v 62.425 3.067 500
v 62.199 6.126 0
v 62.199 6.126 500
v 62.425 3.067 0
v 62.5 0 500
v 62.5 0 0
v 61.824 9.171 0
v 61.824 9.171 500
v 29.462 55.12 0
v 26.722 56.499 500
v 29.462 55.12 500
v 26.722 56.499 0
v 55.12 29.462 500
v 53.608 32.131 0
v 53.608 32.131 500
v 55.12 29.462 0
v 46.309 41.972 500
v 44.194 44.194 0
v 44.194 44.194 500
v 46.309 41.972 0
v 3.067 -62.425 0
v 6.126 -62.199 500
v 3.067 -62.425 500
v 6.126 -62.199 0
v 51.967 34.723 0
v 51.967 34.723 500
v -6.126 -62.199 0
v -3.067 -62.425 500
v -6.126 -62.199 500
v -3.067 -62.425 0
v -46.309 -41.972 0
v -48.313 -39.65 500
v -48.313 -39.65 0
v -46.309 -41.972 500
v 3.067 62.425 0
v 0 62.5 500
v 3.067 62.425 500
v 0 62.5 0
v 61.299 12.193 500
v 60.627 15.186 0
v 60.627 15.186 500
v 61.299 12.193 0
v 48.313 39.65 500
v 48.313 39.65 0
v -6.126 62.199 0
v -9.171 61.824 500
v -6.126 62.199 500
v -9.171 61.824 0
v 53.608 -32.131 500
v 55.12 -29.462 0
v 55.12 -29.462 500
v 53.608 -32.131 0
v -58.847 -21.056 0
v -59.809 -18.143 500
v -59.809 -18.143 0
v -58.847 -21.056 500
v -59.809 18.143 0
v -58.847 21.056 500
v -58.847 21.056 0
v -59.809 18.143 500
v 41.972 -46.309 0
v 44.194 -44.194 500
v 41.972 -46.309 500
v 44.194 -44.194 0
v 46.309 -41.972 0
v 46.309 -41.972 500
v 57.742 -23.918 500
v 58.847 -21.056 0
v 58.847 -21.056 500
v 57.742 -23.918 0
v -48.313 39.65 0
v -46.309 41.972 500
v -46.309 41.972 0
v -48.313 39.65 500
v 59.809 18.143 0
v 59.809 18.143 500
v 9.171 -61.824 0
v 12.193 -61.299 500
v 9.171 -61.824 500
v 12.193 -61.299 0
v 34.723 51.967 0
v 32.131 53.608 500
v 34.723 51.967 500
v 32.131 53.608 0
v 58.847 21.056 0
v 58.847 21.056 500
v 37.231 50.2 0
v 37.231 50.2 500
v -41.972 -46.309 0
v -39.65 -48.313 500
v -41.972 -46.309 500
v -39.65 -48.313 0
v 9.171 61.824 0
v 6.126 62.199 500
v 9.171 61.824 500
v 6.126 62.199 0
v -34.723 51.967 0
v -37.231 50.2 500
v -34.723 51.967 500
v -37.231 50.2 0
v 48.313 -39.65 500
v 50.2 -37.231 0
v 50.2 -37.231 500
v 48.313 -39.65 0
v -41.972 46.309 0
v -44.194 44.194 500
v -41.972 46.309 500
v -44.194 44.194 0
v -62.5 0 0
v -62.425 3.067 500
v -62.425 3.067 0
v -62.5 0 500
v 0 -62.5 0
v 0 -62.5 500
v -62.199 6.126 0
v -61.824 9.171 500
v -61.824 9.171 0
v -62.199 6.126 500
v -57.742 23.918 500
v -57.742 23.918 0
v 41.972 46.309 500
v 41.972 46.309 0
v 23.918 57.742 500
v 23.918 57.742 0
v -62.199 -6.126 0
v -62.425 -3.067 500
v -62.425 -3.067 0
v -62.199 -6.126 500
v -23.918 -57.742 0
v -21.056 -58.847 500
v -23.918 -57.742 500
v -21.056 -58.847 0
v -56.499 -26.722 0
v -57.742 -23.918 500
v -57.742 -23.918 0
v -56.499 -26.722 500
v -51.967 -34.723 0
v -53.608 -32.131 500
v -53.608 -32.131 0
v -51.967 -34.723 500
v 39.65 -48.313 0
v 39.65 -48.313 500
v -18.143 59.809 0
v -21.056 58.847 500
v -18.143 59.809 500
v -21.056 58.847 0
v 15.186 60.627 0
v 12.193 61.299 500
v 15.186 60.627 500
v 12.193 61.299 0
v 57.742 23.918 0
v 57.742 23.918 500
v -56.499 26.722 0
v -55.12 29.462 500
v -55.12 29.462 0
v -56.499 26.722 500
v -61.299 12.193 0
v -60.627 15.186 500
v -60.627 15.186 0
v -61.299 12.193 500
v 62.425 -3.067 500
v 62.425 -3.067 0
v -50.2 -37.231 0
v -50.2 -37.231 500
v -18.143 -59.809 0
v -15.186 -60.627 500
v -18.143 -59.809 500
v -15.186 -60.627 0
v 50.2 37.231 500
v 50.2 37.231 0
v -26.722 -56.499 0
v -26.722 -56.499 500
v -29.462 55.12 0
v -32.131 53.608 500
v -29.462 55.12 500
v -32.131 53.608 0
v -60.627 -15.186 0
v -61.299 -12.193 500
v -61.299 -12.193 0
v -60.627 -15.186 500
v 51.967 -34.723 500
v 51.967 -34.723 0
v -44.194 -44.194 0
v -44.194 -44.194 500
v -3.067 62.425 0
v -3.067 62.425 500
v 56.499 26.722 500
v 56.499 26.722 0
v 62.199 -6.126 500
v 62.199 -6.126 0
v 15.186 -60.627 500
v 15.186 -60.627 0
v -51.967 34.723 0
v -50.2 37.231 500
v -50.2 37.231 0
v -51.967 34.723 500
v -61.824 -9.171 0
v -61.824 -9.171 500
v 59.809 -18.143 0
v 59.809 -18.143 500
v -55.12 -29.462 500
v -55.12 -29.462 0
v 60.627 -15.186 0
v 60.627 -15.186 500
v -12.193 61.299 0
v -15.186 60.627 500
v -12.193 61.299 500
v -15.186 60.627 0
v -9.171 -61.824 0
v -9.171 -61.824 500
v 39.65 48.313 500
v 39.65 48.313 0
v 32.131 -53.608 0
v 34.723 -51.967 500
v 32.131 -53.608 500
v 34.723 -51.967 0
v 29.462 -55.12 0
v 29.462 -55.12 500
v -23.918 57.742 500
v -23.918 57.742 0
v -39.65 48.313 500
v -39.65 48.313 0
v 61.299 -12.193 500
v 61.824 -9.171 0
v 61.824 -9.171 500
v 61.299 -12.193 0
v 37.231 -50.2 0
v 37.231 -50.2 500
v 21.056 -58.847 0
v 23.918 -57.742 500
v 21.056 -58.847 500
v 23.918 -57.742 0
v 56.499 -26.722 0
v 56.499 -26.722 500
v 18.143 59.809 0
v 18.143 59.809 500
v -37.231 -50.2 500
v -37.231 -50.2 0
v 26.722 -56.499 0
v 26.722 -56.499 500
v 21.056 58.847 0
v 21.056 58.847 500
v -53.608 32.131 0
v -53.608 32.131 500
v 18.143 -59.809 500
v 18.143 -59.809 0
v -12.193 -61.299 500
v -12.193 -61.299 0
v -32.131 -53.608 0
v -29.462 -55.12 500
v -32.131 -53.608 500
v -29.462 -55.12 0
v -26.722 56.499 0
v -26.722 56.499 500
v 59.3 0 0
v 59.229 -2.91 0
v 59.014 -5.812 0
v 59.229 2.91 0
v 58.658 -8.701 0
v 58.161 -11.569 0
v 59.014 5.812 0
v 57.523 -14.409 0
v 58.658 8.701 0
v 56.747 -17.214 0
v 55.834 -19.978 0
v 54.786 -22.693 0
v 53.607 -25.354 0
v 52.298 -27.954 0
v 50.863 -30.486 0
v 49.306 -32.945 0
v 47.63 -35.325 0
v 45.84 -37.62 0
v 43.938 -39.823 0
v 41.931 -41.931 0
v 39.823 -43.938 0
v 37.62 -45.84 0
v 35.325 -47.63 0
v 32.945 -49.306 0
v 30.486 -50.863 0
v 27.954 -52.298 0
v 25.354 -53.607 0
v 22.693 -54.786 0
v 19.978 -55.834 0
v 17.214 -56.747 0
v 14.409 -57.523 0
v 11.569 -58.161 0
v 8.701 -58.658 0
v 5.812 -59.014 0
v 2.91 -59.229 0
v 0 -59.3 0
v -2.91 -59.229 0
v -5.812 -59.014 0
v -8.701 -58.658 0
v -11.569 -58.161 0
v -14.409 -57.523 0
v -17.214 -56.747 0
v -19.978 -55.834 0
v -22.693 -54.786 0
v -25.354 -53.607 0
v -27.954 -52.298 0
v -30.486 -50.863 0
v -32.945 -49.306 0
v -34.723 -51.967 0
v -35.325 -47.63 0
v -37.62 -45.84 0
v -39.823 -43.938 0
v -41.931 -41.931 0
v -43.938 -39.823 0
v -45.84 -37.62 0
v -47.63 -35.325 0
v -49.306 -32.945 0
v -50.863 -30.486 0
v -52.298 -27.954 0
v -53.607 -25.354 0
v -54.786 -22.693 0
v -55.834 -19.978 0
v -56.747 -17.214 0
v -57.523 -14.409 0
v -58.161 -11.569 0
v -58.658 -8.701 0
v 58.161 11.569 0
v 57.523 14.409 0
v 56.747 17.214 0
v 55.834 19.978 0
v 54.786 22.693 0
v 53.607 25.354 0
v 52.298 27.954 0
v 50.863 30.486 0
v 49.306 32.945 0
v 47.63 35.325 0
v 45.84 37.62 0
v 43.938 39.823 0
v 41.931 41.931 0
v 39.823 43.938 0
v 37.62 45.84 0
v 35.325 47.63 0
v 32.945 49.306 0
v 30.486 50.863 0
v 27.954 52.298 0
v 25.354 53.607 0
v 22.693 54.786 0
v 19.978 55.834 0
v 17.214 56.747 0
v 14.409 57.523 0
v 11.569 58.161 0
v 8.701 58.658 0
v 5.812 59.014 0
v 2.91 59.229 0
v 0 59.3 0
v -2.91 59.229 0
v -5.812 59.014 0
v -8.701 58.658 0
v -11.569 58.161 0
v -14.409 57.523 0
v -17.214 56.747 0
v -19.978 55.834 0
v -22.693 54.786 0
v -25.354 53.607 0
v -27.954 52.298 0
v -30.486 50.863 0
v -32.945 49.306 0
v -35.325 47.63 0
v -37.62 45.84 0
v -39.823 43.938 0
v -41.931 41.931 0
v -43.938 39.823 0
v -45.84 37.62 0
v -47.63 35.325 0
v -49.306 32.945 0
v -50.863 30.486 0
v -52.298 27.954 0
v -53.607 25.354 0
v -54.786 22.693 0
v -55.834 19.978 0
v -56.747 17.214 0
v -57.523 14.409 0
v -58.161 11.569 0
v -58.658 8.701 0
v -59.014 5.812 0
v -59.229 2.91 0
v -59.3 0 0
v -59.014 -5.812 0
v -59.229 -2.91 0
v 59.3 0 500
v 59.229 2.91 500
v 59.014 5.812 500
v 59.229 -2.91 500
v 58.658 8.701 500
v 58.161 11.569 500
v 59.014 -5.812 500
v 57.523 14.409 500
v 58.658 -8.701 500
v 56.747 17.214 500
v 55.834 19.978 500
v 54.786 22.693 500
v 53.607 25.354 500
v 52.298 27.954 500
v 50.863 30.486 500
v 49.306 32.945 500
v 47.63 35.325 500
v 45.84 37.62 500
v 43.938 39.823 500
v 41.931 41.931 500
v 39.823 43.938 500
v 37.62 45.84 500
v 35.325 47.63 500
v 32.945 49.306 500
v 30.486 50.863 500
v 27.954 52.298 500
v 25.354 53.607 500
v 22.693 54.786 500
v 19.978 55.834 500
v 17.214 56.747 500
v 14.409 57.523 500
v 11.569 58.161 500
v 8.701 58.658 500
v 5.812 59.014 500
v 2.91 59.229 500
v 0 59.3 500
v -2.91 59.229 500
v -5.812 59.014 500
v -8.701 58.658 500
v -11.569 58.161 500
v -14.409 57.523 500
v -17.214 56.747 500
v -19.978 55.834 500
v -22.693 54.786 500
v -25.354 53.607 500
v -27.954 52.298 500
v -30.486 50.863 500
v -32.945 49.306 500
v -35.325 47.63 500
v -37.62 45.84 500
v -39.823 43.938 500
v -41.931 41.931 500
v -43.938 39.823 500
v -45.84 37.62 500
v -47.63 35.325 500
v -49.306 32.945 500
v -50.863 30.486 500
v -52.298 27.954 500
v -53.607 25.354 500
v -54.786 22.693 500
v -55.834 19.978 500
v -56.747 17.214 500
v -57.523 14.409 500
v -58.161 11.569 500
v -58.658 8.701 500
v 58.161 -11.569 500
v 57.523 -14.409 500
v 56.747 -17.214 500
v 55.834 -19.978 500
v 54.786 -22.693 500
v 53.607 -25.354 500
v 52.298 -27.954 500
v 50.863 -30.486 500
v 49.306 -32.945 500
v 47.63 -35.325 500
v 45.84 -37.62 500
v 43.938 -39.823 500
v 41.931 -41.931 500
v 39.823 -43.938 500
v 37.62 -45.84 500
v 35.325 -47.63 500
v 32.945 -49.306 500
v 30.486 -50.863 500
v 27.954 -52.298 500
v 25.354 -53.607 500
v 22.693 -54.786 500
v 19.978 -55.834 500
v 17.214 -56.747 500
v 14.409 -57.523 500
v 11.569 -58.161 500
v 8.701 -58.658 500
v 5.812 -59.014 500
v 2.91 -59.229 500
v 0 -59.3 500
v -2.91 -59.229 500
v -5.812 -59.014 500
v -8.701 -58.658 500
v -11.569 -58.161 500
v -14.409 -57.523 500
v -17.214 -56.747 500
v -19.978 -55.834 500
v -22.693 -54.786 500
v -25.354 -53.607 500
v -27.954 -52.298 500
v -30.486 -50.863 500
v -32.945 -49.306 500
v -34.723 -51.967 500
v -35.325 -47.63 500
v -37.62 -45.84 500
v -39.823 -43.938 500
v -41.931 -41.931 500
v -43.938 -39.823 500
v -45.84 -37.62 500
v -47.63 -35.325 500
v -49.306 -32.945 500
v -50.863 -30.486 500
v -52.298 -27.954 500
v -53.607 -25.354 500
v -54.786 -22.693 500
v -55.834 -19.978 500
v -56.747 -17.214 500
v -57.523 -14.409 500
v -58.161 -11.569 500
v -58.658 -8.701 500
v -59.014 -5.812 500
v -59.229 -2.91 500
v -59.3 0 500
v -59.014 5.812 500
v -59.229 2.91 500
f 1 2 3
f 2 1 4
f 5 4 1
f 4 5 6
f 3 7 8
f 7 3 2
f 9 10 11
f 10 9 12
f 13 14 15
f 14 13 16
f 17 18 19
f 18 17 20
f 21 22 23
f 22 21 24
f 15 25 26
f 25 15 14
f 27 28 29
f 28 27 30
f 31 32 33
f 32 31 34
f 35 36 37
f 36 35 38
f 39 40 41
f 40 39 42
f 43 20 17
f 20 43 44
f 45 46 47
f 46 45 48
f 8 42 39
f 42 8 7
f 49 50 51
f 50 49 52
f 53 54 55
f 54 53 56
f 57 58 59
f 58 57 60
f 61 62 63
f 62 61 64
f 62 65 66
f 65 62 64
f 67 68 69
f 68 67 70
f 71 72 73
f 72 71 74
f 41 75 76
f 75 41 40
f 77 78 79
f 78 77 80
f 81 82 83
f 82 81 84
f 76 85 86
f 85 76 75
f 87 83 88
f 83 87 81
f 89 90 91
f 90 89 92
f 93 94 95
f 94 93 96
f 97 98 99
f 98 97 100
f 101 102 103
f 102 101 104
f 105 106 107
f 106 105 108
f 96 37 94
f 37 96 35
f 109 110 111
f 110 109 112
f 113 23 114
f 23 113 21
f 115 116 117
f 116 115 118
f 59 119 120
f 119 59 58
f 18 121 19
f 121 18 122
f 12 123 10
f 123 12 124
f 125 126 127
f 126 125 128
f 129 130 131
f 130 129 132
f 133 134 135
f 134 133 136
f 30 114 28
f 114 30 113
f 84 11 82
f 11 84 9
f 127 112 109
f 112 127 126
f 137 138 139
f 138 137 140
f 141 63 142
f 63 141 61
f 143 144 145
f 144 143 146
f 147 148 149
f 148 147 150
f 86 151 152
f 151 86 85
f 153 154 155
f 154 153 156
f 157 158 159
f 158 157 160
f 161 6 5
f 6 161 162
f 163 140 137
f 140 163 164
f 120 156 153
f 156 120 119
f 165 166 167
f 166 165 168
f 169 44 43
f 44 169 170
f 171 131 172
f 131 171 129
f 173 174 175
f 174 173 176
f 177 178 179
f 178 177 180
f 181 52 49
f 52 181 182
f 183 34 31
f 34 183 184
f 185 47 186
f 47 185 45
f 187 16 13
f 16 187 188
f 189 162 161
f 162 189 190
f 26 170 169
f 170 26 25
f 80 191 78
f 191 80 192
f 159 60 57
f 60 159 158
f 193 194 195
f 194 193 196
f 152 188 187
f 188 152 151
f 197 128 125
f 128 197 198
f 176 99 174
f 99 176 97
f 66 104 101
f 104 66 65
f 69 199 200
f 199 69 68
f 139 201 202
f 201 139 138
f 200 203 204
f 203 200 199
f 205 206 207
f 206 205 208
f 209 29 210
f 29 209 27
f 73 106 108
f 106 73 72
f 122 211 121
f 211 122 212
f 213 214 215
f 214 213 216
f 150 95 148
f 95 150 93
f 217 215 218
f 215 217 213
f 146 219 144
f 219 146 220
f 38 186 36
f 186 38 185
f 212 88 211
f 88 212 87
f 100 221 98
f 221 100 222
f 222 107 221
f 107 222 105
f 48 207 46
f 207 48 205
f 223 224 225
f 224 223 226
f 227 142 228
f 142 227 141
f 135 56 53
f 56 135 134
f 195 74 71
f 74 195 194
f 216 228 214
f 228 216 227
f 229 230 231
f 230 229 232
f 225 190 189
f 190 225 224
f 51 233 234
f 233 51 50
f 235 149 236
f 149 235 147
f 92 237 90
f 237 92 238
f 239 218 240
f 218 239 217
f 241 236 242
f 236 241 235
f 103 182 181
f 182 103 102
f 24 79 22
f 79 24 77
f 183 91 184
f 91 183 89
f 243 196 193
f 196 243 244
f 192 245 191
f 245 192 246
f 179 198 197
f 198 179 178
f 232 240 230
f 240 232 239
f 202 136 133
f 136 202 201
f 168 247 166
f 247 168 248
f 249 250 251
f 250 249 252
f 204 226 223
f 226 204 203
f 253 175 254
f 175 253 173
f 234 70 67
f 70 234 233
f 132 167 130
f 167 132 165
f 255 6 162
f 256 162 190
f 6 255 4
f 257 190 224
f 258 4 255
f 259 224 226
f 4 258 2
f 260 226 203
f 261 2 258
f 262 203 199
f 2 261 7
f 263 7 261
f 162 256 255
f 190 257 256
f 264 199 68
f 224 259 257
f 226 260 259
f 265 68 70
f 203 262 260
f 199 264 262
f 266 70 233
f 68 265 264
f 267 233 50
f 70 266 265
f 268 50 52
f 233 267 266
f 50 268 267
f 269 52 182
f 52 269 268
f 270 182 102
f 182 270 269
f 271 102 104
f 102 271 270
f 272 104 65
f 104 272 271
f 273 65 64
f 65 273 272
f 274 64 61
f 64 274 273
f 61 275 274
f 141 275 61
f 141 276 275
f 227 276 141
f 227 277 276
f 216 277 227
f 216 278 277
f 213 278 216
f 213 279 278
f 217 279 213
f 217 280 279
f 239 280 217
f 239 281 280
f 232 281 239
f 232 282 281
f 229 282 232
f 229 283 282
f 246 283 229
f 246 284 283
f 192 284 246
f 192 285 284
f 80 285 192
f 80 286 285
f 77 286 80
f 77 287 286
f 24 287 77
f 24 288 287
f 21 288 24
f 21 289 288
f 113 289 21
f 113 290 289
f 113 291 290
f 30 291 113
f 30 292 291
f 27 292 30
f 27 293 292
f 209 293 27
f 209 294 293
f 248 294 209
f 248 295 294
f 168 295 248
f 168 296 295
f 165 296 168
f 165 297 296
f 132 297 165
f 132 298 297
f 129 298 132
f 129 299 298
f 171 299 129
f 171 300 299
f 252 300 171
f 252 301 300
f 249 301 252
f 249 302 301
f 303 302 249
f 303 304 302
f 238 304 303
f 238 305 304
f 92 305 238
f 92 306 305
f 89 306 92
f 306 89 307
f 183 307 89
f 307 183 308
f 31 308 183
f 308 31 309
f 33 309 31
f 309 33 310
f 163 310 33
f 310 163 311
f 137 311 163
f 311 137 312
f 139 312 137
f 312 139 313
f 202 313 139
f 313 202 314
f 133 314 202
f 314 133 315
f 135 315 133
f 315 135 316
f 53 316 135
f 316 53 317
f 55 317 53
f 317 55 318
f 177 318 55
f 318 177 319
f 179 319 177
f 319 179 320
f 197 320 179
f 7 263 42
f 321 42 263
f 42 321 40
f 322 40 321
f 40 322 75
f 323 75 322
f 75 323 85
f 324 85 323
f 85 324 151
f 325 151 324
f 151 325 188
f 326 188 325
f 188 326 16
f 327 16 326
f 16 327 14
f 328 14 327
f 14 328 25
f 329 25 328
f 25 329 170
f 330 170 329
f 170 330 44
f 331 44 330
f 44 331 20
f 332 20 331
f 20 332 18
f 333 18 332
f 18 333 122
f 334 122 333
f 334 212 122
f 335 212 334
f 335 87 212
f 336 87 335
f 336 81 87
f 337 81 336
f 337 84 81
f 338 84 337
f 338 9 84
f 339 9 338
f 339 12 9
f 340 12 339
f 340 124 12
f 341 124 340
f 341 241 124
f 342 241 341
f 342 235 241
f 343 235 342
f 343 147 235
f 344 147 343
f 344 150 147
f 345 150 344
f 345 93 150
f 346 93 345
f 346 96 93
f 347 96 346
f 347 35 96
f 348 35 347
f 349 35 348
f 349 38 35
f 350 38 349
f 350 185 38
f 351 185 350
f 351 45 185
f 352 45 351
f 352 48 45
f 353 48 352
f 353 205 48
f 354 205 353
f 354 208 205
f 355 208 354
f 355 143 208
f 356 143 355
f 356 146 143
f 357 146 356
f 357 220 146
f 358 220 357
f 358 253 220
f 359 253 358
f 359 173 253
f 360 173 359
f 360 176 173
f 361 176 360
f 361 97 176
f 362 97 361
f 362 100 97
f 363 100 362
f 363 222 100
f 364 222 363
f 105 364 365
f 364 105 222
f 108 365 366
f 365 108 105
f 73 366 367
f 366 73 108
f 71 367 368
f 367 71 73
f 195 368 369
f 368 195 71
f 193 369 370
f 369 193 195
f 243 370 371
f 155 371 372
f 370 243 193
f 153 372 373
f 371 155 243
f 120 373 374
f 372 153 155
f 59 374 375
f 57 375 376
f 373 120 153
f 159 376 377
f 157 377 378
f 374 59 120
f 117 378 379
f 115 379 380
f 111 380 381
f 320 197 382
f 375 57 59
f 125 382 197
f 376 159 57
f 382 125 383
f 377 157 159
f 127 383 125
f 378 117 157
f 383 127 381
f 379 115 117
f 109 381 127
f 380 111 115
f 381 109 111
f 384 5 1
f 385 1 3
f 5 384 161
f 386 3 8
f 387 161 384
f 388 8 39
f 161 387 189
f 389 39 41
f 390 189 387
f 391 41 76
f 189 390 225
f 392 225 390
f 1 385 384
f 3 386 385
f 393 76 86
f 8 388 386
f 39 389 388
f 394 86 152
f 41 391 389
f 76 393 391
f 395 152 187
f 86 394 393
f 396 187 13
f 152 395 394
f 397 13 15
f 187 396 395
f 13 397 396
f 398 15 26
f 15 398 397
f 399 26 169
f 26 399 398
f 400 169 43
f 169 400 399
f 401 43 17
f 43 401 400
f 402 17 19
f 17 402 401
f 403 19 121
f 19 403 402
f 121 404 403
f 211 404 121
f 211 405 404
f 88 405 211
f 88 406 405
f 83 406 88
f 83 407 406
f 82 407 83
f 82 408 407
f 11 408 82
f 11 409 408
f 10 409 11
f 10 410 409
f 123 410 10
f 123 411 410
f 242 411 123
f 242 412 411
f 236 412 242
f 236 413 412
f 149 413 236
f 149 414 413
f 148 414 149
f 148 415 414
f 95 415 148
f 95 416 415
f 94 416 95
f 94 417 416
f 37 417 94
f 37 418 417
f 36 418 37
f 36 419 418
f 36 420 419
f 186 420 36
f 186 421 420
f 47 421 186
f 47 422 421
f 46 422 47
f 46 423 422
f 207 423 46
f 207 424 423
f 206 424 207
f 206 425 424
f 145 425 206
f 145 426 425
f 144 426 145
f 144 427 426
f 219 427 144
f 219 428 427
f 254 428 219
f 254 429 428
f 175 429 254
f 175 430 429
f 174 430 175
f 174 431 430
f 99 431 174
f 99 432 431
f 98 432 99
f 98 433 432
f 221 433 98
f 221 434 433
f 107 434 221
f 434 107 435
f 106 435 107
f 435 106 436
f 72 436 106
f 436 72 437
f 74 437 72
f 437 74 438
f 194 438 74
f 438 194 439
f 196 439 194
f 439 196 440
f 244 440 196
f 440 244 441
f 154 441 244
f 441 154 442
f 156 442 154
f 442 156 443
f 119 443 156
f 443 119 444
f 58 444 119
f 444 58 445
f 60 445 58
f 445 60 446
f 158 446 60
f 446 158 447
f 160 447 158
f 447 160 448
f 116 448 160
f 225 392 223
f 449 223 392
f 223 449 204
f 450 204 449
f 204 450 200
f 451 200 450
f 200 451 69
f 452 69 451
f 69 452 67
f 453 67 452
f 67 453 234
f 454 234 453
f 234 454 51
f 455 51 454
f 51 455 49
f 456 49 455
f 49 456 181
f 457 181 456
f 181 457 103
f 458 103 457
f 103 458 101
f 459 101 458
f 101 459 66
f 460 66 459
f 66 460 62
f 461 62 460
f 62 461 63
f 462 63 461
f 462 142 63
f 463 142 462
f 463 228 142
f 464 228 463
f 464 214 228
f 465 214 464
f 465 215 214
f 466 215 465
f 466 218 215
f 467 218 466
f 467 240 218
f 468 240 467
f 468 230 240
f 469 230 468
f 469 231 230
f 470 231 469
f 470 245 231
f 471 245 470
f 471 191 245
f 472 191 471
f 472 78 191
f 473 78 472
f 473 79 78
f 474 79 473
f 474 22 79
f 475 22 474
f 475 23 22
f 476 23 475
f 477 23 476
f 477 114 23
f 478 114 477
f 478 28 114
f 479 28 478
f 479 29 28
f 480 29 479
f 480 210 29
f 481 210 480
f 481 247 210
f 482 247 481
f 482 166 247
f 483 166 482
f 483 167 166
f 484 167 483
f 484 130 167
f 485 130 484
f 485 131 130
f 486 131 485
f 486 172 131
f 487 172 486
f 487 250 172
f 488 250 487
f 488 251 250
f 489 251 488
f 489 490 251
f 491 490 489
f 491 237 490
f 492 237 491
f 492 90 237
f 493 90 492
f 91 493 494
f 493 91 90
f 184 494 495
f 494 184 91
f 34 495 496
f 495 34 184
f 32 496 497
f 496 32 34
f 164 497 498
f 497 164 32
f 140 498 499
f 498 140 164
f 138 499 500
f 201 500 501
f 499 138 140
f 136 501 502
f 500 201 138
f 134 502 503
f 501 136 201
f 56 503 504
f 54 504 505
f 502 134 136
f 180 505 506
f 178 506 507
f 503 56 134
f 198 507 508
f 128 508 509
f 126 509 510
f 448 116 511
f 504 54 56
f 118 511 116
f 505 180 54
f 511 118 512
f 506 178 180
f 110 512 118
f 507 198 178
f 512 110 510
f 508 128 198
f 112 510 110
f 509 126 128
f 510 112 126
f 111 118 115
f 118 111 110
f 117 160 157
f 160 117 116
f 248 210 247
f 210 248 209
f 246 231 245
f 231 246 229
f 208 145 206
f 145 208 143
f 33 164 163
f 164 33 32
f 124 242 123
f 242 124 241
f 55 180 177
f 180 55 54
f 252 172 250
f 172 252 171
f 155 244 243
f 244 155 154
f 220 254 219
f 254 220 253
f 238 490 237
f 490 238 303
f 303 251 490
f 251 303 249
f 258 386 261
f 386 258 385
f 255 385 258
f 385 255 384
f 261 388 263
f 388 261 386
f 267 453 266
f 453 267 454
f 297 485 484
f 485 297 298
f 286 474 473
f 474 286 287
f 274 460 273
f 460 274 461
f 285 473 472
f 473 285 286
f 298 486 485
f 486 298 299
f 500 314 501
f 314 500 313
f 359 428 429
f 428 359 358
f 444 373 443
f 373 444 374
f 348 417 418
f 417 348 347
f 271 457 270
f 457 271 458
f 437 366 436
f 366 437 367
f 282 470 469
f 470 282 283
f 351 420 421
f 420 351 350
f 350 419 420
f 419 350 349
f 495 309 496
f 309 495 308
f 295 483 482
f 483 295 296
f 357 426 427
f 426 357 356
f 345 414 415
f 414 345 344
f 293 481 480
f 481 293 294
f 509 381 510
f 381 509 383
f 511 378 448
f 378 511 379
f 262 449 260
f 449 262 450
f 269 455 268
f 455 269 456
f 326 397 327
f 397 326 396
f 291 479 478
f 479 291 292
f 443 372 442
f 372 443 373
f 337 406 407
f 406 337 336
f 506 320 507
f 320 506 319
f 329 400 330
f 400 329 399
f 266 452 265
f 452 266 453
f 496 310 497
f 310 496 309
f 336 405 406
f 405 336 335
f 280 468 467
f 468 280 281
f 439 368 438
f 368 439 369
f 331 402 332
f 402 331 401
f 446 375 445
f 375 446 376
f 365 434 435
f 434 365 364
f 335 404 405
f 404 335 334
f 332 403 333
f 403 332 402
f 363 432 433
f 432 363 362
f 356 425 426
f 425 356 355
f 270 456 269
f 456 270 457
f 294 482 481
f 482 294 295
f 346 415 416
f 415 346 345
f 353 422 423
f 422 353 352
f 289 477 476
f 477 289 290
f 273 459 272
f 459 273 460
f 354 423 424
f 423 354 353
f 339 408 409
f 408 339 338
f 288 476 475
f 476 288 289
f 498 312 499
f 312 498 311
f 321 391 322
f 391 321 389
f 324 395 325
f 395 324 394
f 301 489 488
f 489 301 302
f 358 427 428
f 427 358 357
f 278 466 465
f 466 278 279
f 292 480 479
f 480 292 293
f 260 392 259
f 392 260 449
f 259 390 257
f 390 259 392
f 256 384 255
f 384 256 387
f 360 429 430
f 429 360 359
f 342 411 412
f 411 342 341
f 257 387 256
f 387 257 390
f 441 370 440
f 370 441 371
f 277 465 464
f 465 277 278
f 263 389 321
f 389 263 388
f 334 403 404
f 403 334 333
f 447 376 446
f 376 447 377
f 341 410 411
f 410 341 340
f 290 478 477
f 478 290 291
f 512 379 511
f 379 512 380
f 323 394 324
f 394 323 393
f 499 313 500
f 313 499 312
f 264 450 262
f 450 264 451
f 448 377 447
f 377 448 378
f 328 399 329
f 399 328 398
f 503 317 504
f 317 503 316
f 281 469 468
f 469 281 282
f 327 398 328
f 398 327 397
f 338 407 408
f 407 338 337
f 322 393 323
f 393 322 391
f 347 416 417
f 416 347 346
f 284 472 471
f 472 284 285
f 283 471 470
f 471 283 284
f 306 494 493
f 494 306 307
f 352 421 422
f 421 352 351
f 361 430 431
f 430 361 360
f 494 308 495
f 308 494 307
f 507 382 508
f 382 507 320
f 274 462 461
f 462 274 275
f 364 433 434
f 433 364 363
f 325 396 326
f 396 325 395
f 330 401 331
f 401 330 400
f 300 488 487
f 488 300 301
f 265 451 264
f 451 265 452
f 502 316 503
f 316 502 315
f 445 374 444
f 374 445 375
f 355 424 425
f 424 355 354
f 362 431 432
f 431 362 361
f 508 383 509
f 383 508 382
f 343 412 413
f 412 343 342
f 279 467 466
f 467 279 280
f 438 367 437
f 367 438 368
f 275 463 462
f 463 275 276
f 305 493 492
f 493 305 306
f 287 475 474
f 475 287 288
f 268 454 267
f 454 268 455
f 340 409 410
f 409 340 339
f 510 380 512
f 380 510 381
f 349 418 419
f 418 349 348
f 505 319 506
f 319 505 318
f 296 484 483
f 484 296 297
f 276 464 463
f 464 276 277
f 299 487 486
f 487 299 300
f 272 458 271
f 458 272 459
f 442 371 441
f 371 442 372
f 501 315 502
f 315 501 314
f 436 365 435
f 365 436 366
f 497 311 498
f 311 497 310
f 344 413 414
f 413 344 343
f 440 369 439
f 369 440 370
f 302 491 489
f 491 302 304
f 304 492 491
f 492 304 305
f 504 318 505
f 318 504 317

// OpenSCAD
$fn = 128;

// HT pipe parameters (approximate, in mm)
pipe_dn = 125;          // nominal diameter
pipe_length = 500;      // length
wall_thickness = 3.2;   // typical HT DN125 wall thickness (approx.)

// Derived
outer_d = pipe_dn;
inner_d = outer_d - 2 * wall_thickness;

module ht_pipe(od, id, len) {
    difference() {
        cylinder(h = len, d = od);
        translate([0, 0, -0.5])
            cylinder(h = len + 1, d = id);
    }
}

ht_pipe(outer_d, inner_d, pipe_length);
